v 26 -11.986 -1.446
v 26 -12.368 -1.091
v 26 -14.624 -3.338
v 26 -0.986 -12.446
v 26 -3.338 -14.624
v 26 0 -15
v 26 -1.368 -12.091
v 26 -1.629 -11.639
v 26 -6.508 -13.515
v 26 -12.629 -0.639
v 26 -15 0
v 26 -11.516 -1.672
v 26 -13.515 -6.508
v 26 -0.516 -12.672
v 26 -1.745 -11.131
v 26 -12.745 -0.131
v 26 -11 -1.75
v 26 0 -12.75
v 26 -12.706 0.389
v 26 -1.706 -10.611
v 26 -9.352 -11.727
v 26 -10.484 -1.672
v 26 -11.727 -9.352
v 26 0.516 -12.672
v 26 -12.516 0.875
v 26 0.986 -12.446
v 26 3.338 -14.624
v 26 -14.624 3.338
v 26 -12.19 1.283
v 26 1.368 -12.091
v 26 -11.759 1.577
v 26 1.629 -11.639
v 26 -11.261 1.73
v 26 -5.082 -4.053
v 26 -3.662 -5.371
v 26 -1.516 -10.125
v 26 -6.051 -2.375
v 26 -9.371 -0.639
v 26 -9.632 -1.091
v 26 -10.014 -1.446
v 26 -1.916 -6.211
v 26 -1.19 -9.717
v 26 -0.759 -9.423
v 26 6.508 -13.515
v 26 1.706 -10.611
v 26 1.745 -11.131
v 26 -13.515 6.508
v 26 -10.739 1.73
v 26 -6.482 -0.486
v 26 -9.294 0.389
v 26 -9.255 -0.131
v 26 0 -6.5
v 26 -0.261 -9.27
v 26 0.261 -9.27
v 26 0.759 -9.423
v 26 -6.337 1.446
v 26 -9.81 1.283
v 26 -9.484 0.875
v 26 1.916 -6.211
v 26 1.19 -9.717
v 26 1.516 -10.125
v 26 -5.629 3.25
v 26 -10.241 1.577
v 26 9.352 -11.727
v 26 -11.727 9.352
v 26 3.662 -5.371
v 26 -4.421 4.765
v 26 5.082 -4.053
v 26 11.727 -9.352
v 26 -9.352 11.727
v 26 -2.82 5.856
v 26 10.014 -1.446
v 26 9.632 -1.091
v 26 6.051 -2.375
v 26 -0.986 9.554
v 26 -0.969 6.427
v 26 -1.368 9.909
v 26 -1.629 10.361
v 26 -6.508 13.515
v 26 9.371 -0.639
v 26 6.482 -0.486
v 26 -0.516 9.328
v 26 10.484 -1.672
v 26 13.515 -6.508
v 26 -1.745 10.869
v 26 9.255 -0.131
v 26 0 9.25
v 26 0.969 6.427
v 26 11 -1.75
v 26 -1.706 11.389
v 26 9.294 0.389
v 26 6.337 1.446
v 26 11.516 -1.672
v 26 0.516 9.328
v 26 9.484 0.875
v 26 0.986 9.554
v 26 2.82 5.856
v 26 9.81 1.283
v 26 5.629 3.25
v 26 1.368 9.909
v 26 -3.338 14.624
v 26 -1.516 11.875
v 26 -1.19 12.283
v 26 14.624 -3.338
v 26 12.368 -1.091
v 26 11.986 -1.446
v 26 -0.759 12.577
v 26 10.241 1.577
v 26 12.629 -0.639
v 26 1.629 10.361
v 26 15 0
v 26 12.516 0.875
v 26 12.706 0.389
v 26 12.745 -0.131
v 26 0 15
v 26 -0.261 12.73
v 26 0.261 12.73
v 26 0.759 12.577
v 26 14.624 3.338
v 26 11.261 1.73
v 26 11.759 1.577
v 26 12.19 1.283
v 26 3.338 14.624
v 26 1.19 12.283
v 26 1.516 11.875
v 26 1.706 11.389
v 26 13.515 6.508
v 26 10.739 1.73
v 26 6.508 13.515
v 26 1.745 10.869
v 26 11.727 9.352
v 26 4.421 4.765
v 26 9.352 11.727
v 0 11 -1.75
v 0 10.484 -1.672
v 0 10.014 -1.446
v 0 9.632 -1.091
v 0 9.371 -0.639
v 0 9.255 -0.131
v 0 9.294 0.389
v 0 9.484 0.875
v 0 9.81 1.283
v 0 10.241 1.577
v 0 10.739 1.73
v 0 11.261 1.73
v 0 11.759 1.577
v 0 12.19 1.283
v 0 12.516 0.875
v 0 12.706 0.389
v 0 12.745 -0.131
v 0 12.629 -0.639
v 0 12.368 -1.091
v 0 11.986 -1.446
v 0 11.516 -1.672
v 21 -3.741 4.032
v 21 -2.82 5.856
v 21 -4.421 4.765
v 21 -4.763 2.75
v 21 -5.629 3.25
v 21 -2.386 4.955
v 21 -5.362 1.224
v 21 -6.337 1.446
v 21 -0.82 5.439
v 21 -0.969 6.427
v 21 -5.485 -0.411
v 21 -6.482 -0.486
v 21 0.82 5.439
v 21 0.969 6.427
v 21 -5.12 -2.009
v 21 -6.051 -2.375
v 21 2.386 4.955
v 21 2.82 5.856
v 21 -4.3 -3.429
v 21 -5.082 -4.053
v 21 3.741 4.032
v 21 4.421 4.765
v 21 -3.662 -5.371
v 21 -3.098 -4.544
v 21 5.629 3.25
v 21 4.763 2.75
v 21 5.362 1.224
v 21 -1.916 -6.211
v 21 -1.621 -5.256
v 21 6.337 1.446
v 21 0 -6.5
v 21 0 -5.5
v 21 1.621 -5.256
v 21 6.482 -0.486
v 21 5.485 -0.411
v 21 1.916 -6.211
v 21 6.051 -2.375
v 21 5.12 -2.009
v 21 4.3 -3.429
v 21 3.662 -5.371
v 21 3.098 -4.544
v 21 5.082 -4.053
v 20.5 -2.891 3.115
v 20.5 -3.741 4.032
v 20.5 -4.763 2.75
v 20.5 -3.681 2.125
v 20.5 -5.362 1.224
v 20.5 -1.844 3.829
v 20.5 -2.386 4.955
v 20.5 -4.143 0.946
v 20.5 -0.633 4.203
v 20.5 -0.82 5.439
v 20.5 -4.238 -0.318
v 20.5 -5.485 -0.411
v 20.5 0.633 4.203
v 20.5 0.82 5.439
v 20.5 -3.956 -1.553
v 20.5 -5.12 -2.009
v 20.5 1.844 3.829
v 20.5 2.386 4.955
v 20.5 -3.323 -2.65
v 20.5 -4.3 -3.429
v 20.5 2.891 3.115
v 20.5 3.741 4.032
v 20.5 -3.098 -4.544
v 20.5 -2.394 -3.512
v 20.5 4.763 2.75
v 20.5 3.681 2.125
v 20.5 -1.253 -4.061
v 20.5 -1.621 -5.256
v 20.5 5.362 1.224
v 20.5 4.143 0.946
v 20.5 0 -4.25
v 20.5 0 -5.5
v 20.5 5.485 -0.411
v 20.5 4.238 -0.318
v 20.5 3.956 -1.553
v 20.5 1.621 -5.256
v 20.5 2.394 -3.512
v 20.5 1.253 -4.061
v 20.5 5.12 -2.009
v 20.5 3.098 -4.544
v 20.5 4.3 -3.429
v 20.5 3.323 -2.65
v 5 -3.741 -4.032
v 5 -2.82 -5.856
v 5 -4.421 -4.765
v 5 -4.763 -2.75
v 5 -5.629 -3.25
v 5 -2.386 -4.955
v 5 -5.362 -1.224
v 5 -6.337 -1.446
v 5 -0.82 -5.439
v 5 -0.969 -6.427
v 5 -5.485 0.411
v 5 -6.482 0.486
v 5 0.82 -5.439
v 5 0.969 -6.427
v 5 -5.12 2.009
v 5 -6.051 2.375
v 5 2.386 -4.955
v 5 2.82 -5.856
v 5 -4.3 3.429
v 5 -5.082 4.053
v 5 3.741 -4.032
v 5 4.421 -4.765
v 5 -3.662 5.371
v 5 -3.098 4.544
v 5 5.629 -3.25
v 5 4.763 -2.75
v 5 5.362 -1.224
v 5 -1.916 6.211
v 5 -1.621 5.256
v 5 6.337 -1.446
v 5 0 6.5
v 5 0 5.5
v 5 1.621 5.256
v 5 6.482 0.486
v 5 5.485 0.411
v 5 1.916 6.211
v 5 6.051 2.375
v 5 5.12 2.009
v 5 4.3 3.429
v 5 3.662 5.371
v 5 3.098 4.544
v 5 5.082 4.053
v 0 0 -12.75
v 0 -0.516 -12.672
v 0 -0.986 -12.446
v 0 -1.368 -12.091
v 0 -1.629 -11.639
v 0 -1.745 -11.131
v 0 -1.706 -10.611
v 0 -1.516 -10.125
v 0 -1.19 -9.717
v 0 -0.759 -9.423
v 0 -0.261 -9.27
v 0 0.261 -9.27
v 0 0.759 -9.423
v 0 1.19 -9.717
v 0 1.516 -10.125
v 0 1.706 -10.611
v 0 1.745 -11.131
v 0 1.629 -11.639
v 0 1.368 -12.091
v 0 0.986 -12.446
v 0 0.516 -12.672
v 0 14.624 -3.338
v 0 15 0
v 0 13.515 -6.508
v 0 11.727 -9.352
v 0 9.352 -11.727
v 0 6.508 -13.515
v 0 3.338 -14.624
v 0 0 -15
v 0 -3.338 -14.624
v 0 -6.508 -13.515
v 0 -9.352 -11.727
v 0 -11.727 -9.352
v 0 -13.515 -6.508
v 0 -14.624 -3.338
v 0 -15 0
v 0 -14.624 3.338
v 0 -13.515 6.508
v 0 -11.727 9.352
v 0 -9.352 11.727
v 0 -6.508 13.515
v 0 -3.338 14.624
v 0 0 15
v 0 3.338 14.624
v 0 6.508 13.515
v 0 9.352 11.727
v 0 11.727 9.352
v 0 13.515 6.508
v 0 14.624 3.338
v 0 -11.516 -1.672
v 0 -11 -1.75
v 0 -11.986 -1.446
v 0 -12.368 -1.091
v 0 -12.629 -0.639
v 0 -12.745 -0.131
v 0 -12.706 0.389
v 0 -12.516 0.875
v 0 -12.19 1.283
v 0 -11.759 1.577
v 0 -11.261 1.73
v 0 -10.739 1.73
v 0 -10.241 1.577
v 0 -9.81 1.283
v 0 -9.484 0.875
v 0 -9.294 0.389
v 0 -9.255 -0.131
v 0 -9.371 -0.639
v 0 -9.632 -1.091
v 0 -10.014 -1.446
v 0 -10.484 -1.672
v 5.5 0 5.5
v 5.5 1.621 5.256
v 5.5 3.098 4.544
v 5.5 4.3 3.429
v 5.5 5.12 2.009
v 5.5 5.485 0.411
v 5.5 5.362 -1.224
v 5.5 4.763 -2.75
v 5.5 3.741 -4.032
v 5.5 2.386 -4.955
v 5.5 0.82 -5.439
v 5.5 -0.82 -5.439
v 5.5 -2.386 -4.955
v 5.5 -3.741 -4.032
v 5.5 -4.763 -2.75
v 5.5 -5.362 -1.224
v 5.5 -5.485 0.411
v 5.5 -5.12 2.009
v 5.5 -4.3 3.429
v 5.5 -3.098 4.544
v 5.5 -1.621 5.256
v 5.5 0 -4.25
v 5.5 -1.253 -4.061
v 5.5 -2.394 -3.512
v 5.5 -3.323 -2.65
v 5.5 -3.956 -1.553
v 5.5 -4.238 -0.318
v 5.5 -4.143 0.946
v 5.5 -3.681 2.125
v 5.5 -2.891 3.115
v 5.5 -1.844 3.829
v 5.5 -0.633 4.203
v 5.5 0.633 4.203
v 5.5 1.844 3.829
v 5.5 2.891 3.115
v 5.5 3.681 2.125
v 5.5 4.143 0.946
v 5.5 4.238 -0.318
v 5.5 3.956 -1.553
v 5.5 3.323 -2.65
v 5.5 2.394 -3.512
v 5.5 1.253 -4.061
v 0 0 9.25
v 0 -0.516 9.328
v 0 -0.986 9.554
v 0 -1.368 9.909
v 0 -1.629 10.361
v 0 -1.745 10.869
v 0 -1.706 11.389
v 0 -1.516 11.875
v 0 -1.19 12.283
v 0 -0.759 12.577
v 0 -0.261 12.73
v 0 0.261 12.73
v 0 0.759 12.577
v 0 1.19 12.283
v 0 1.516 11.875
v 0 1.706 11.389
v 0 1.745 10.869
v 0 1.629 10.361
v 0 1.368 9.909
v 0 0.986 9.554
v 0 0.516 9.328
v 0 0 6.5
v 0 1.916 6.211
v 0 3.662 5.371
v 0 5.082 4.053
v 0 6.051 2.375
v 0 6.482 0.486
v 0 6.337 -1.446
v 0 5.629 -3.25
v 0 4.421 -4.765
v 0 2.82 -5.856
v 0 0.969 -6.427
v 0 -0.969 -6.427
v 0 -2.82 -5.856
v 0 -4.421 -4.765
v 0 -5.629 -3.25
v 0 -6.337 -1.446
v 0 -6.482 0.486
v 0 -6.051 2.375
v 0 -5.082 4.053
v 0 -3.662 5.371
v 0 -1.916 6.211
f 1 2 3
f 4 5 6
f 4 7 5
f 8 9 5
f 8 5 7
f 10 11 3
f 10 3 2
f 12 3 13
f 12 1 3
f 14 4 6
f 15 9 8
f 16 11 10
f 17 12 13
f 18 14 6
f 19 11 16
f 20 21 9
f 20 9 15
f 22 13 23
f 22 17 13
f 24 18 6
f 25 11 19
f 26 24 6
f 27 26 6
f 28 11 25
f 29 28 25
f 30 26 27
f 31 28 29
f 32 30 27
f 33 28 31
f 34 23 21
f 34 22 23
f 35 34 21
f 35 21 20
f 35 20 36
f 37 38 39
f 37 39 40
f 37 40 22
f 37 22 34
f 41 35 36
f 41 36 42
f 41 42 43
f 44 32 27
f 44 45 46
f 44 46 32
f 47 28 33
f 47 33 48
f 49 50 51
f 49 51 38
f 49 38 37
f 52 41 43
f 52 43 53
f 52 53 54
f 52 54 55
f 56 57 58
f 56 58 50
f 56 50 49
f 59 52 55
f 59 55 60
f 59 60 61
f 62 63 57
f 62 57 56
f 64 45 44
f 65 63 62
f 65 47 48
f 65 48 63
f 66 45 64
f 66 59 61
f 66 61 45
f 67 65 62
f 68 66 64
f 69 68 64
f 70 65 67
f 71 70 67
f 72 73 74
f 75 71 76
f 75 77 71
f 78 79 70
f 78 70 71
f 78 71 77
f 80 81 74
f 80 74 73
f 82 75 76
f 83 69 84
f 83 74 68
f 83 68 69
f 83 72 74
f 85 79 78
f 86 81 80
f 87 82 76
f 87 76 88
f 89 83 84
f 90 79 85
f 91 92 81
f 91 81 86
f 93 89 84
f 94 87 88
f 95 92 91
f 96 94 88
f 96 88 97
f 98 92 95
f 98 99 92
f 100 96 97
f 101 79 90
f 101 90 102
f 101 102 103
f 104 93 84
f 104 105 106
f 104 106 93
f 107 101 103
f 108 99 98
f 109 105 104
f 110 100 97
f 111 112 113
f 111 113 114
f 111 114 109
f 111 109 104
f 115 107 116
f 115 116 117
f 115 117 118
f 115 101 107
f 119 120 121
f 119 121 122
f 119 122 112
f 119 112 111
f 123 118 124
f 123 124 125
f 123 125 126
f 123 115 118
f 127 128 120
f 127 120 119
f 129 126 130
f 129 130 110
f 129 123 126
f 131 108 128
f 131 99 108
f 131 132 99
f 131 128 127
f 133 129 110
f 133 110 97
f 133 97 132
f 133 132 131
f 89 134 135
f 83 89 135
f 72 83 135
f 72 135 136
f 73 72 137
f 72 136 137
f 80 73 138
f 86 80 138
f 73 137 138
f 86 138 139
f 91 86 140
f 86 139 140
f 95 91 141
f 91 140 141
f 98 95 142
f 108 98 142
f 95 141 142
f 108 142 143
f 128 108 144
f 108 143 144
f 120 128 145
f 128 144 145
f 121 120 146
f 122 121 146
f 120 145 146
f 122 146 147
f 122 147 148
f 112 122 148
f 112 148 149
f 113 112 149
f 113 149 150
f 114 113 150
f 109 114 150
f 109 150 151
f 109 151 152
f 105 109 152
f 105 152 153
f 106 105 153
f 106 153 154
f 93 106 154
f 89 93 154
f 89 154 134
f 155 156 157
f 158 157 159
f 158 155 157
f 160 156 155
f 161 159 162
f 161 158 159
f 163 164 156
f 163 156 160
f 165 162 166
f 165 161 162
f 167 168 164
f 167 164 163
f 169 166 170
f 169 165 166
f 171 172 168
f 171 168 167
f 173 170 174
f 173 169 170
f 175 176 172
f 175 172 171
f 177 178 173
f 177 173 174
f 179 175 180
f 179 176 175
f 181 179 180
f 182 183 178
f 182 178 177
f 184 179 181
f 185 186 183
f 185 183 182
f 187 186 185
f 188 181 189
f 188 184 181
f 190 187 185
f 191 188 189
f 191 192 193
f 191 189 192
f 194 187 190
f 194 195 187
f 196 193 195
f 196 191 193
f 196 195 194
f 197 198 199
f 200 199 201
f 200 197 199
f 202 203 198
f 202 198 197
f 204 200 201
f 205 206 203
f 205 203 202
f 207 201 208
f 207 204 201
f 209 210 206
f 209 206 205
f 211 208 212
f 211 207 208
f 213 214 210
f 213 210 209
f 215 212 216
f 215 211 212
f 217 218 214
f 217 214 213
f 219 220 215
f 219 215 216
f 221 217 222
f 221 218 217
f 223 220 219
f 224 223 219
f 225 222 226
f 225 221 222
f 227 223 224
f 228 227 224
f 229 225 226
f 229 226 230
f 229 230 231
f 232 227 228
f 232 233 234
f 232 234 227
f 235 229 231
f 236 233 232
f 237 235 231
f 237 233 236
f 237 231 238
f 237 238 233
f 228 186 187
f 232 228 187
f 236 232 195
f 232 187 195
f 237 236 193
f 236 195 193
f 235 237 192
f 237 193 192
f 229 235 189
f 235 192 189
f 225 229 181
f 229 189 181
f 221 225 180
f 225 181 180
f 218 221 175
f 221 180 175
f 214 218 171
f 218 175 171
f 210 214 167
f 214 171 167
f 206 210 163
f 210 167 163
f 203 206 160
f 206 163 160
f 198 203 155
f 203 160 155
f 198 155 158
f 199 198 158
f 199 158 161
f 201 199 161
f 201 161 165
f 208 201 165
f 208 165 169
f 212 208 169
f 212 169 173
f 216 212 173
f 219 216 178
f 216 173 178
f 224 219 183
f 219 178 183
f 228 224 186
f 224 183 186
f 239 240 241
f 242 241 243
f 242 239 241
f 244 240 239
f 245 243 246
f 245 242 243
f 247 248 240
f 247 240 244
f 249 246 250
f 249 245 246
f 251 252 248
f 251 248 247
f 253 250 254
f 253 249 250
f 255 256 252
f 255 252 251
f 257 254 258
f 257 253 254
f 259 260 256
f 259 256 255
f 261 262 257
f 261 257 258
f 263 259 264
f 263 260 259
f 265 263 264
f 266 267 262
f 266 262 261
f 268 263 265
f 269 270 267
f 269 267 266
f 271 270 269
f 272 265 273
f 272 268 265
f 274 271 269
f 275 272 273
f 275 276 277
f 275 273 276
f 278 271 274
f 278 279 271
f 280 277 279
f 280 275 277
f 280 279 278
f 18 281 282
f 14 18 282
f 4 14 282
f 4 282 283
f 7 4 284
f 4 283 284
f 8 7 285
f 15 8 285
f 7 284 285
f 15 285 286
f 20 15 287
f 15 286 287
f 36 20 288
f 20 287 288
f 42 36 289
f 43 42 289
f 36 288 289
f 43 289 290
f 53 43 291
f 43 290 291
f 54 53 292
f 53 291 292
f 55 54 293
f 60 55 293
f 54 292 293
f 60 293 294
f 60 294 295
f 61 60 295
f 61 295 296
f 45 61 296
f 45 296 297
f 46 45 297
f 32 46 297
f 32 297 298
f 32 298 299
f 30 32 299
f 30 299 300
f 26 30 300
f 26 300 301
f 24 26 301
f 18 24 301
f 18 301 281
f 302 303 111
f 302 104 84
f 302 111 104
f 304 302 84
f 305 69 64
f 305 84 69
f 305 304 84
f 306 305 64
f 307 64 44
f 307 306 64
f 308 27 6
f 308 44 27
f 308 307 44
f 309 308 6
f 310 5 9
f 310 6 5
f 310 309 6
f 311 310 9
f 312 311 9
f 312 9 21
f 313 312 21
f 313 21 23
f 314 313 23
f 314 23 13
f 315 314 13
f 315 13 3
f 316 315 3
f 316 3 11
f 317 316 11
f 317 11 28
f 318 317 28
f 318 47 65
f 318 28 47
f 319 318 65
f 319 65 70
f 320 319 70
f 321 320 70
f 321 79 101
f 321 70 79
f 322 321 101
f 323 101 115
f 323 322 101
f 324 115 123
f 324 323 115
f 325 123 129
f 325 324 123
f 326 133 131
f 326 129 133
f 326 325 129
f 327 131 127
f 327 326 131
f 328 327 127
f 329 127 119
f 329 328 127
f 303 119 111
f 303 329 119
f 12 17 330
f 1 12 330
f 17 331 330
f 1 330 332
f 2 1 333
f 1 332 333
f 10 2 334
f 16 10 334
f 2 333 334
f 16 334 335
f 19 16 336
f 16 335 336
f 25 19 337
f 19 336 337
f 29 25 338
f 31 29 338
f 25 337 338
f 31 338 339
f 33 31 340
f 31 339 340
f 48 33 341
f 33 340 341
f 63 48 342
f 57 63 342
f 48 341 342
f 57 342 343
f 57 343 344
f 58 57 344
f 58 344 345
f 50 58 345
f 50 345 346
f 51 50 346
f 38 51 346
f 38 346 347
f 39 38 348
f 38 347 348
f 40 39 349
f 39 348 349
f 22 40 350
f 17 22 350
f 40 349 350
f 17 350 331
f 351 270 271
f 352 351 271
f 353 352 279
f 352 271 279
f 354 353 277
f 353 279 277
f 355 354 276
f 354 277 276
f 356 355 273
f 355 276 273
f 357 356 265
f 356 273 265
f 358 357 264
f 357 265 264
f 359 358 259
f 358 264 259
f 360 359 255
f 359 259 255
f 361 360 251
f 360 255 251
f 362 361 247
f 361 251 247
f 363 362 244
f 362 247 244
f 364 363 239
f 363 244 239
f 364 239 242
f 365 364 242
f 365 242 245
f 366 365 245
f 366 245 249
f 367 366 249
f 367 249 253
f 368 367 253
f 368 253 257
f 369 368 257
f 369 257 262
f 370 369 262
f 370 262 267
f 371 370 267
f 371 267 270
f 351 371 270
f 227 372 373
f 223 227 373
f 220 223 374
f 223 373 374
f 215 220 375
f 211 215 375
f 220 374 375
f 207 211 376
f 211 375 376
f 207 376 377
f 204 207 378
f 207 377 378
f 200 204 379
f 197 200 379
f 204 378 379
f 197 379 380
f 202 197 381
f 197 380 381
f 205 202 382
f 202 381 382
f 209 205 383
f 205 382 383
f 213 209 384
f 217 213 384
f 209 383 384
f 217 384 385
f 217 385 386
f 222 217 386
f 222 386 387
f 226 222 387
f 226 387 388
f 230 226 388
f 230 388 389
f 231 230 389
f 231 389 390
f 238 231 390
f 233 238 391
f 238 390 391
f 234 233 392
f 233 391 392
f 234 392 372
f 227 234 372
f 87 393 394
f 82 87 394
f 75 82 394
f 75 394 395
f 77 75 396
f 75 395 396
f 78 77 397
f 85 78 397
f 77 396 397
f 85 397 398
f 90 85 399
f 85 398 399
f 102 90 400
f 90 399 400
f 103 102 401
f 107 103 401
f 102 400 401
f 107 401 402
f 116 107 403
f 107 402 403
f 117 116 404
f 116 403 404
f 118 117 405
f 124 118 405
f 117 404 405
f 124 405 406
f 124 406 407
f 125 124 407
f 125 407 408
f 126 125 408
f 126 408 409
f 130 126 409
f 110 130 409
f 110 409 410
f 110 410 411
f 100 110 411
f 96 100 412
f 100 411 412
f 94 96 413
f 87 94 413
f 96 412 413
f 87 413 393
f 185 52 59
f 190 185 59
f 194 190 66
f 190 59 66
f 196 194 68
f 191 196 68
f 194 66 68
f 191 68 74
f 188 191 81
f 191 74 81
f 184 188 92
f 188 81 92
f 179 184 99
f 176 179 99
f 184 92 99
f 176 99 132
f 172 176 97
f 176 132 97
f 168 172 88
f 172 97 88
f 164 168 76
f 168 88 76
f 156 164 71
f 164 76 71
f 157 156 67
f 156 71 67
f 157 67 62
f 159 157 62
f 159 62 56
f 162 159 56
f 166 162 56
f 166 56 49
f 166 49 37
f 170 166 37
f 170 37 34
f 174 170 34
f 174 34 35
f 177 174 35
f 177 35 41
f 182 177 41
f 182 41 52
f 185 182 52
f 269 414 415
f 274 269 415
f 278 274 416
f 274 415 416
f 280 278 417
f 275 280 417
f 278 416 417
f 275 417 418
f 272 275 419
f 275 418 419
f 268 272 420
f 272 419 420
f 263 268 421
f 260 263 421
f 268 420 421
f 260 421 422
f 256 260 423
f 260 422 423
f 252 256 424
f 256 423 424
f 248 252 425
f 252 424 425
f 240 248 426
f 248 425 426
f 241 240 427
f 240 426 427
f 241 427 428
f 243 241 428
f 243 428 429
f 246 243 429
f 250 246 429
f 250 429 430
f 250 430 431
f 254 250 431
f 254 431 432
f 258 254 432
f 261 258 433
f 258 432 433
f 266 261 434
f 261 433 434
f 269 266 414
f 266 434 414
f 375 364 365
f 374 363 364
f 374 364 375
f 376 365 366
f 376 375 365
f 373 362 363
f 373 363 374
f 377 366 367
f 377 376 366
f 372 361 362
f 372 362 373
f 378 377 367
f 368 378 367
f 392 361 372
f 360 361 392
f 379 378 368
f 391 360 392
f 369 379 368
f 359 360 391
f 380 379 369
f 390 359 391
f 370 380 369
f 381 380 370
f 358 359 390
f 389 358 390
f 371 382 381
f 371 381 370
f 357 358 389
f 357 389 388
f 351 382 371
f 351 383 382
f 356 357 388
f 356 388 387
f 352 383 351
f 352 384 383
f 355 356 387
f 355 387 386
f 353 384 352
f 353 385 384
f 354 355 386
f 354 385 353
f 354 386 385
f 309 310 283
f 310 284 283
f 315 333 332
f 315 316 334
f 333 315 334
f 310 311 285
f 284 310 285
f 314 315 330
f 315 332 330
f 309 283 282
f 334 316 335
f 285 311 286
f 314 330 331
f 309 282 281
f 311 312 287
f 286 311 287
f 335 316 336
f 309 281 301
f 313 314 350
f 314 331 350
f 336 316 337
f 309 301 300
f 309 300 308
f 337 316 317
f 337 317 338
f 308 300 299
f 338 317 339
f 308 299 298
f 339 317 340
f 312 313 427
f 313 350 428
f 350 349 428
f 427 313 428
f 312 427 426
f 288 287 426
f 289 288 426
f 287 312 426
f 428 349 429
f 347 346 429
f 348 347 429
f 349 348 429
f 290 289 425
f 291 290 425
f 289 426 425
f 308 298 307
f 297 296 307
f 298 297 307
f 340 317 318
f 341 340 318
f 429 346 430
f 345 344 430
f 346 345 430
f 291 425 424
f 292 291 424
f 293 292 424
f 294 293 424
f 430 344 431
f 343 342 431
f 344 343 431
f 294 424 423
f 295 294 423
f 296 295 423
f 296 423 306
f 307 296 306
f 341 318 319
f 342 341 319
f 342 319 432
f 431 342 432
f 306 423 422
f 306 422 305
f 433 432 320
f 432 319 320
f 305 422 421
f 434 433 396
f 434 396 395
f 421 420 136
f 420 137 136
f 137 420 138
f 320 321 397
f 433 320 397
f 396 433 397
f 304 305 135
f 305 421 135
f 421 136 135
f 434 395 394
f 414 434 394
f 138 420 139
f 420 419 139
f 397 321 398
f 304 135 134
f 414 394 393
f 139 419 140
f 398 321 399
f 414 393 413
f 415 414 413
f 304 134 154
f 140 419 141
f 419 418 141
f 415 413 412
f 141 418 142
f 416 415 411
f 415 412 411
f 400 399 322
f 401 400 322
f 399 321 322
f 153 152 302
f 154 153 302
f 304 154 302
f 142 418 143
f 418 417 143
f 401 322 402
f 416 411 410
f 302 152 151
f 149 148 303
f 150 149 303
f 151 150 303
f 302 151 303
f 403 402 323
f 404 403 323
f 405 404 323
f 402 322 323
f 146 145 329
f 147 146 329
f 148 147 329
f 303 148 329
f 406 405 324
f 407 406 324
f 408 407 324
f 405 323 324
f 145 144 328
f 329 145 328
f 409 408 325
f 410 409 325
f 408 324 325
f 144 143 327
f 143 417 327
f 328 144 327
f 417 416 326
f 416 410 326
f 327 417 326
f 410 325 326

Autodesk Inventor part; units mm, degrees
ref_plane "YZ Plane" through (0, 0, 0) normal (1, 0, 0) x (0, 1, 0)
sketch "Szkic1" plane through (0, 0, 0) normal (1, 0, 0) x (0, 1, 0)
  circle A0 centre (0, 0) radius 15
  dimension "d0" = 30
extrude "Wyciągnięcie proste1" add sketch "Szkic1" along normal blind 26
sketch "Szkic2" plane through (26, 0, 0) normal (1, 0, 0) x (0, 0, -1)
  point P0 (0, 0)
  point P1 (0, 0)
hole "Otwór1" at (26, 0, 0) direction (-1, 0, 0) diameter 8.5 end through all
sketch "Szkic3" plane through (26, 0, 0) normal (1, 0, 0) x (0, 0, -1)
  point P0 (0, 0)
  point P1 (11, 0)
  point P2 (0, 11)
  point P3 (-11, 0)
  point P4 (0, -11)
  dimension "d10" = 11
  dimension "d13" = 360
hole "Otwór2" at (26, 0, -11) at (26, 11, 0) at (26, 0, 11) at (26, -11, 0) direction (-1, 0, 0) diameter 3.5 depth 26 tip angle 118
sketch "Szkic4" plane through (26, 0, 0) normal (1, 0, 0) x (0, 0, -1)
  line L0 (0, 0) -> (-10.6066, 10.6066)
  line L1 (0, 0) -> (15, 0) construction
  line L2 (0, 0) -> (10.6066, 10.6066)
  line L3 (0, 0) -> (15, 0) construction
  dimension "d22" = 15
  dimension "d23" = 135
  dimension "d24" = 15
  dimension "d25" = 45
ref_plane "Płaszczyzna konstrukcyjna1" through (26, 10.6066, 10.6066) normal (0, 0.7071, 0.7071) x (-1, 0, 0)
ref_plane "Płaszczyzna konstrukcyjna2" through (26, 10.6066, -10.6066) normal (0, 0.7071, -0.7071) x (-1, 0, 0)
sketch "Szkic7" plane through (0, 0, 0) normal (-1, 0, 0) x (0, 0, 1)
  circle A0 centre (0, 0) radius 6.5
  dimension "d42" = 13
extrude "Wyciągnięcie proste2" cut sketch "Szkic7" against normal blind 5
sketch "Szkic13" plane through (5, 0, 0) normal (-1, 0, 0) x (0, 0, 1)
  circle A0 centre (0, 0) radius 5.5
  dimension "d80" = 11
extrude "Wyciągnięcie proste5" cut sketch "Szkic13" against normal blind 0.5
sketch "Szkic14" plane through (26, 0, 0) normal (1, 0, 0) x (0, 0, -1)
  circle A0 centre (0, 0) radius 6.5
  dimension "d83" = 13
extrude "Wyciągnięcie proste6" cut sketch "Szkic14" against normal blind 5
sketch "Szkic15" plane through (21, 0, 0) normal (1, 0, 0) x (0, 0, -1)
  circle A0 centre (0, 0) radius 5.5
  dimension "d86" = 11
extrude "Wyciągnięcie proste7" cut sketch "Szkic15" against normal blind 0.5
equation "\"d0\" = radius"
equation "\"d16\" = d1"
equation "\"d20\" = d1"
equation "\"d22\" = 0.5 * radius"
equation "\"d24\" = d22"
equation "\"radius\" = 30"
equation "\"d1\" = 26"
properties part number "piasta_kola_przedniego_fi8" material "Aluminum 6061"
